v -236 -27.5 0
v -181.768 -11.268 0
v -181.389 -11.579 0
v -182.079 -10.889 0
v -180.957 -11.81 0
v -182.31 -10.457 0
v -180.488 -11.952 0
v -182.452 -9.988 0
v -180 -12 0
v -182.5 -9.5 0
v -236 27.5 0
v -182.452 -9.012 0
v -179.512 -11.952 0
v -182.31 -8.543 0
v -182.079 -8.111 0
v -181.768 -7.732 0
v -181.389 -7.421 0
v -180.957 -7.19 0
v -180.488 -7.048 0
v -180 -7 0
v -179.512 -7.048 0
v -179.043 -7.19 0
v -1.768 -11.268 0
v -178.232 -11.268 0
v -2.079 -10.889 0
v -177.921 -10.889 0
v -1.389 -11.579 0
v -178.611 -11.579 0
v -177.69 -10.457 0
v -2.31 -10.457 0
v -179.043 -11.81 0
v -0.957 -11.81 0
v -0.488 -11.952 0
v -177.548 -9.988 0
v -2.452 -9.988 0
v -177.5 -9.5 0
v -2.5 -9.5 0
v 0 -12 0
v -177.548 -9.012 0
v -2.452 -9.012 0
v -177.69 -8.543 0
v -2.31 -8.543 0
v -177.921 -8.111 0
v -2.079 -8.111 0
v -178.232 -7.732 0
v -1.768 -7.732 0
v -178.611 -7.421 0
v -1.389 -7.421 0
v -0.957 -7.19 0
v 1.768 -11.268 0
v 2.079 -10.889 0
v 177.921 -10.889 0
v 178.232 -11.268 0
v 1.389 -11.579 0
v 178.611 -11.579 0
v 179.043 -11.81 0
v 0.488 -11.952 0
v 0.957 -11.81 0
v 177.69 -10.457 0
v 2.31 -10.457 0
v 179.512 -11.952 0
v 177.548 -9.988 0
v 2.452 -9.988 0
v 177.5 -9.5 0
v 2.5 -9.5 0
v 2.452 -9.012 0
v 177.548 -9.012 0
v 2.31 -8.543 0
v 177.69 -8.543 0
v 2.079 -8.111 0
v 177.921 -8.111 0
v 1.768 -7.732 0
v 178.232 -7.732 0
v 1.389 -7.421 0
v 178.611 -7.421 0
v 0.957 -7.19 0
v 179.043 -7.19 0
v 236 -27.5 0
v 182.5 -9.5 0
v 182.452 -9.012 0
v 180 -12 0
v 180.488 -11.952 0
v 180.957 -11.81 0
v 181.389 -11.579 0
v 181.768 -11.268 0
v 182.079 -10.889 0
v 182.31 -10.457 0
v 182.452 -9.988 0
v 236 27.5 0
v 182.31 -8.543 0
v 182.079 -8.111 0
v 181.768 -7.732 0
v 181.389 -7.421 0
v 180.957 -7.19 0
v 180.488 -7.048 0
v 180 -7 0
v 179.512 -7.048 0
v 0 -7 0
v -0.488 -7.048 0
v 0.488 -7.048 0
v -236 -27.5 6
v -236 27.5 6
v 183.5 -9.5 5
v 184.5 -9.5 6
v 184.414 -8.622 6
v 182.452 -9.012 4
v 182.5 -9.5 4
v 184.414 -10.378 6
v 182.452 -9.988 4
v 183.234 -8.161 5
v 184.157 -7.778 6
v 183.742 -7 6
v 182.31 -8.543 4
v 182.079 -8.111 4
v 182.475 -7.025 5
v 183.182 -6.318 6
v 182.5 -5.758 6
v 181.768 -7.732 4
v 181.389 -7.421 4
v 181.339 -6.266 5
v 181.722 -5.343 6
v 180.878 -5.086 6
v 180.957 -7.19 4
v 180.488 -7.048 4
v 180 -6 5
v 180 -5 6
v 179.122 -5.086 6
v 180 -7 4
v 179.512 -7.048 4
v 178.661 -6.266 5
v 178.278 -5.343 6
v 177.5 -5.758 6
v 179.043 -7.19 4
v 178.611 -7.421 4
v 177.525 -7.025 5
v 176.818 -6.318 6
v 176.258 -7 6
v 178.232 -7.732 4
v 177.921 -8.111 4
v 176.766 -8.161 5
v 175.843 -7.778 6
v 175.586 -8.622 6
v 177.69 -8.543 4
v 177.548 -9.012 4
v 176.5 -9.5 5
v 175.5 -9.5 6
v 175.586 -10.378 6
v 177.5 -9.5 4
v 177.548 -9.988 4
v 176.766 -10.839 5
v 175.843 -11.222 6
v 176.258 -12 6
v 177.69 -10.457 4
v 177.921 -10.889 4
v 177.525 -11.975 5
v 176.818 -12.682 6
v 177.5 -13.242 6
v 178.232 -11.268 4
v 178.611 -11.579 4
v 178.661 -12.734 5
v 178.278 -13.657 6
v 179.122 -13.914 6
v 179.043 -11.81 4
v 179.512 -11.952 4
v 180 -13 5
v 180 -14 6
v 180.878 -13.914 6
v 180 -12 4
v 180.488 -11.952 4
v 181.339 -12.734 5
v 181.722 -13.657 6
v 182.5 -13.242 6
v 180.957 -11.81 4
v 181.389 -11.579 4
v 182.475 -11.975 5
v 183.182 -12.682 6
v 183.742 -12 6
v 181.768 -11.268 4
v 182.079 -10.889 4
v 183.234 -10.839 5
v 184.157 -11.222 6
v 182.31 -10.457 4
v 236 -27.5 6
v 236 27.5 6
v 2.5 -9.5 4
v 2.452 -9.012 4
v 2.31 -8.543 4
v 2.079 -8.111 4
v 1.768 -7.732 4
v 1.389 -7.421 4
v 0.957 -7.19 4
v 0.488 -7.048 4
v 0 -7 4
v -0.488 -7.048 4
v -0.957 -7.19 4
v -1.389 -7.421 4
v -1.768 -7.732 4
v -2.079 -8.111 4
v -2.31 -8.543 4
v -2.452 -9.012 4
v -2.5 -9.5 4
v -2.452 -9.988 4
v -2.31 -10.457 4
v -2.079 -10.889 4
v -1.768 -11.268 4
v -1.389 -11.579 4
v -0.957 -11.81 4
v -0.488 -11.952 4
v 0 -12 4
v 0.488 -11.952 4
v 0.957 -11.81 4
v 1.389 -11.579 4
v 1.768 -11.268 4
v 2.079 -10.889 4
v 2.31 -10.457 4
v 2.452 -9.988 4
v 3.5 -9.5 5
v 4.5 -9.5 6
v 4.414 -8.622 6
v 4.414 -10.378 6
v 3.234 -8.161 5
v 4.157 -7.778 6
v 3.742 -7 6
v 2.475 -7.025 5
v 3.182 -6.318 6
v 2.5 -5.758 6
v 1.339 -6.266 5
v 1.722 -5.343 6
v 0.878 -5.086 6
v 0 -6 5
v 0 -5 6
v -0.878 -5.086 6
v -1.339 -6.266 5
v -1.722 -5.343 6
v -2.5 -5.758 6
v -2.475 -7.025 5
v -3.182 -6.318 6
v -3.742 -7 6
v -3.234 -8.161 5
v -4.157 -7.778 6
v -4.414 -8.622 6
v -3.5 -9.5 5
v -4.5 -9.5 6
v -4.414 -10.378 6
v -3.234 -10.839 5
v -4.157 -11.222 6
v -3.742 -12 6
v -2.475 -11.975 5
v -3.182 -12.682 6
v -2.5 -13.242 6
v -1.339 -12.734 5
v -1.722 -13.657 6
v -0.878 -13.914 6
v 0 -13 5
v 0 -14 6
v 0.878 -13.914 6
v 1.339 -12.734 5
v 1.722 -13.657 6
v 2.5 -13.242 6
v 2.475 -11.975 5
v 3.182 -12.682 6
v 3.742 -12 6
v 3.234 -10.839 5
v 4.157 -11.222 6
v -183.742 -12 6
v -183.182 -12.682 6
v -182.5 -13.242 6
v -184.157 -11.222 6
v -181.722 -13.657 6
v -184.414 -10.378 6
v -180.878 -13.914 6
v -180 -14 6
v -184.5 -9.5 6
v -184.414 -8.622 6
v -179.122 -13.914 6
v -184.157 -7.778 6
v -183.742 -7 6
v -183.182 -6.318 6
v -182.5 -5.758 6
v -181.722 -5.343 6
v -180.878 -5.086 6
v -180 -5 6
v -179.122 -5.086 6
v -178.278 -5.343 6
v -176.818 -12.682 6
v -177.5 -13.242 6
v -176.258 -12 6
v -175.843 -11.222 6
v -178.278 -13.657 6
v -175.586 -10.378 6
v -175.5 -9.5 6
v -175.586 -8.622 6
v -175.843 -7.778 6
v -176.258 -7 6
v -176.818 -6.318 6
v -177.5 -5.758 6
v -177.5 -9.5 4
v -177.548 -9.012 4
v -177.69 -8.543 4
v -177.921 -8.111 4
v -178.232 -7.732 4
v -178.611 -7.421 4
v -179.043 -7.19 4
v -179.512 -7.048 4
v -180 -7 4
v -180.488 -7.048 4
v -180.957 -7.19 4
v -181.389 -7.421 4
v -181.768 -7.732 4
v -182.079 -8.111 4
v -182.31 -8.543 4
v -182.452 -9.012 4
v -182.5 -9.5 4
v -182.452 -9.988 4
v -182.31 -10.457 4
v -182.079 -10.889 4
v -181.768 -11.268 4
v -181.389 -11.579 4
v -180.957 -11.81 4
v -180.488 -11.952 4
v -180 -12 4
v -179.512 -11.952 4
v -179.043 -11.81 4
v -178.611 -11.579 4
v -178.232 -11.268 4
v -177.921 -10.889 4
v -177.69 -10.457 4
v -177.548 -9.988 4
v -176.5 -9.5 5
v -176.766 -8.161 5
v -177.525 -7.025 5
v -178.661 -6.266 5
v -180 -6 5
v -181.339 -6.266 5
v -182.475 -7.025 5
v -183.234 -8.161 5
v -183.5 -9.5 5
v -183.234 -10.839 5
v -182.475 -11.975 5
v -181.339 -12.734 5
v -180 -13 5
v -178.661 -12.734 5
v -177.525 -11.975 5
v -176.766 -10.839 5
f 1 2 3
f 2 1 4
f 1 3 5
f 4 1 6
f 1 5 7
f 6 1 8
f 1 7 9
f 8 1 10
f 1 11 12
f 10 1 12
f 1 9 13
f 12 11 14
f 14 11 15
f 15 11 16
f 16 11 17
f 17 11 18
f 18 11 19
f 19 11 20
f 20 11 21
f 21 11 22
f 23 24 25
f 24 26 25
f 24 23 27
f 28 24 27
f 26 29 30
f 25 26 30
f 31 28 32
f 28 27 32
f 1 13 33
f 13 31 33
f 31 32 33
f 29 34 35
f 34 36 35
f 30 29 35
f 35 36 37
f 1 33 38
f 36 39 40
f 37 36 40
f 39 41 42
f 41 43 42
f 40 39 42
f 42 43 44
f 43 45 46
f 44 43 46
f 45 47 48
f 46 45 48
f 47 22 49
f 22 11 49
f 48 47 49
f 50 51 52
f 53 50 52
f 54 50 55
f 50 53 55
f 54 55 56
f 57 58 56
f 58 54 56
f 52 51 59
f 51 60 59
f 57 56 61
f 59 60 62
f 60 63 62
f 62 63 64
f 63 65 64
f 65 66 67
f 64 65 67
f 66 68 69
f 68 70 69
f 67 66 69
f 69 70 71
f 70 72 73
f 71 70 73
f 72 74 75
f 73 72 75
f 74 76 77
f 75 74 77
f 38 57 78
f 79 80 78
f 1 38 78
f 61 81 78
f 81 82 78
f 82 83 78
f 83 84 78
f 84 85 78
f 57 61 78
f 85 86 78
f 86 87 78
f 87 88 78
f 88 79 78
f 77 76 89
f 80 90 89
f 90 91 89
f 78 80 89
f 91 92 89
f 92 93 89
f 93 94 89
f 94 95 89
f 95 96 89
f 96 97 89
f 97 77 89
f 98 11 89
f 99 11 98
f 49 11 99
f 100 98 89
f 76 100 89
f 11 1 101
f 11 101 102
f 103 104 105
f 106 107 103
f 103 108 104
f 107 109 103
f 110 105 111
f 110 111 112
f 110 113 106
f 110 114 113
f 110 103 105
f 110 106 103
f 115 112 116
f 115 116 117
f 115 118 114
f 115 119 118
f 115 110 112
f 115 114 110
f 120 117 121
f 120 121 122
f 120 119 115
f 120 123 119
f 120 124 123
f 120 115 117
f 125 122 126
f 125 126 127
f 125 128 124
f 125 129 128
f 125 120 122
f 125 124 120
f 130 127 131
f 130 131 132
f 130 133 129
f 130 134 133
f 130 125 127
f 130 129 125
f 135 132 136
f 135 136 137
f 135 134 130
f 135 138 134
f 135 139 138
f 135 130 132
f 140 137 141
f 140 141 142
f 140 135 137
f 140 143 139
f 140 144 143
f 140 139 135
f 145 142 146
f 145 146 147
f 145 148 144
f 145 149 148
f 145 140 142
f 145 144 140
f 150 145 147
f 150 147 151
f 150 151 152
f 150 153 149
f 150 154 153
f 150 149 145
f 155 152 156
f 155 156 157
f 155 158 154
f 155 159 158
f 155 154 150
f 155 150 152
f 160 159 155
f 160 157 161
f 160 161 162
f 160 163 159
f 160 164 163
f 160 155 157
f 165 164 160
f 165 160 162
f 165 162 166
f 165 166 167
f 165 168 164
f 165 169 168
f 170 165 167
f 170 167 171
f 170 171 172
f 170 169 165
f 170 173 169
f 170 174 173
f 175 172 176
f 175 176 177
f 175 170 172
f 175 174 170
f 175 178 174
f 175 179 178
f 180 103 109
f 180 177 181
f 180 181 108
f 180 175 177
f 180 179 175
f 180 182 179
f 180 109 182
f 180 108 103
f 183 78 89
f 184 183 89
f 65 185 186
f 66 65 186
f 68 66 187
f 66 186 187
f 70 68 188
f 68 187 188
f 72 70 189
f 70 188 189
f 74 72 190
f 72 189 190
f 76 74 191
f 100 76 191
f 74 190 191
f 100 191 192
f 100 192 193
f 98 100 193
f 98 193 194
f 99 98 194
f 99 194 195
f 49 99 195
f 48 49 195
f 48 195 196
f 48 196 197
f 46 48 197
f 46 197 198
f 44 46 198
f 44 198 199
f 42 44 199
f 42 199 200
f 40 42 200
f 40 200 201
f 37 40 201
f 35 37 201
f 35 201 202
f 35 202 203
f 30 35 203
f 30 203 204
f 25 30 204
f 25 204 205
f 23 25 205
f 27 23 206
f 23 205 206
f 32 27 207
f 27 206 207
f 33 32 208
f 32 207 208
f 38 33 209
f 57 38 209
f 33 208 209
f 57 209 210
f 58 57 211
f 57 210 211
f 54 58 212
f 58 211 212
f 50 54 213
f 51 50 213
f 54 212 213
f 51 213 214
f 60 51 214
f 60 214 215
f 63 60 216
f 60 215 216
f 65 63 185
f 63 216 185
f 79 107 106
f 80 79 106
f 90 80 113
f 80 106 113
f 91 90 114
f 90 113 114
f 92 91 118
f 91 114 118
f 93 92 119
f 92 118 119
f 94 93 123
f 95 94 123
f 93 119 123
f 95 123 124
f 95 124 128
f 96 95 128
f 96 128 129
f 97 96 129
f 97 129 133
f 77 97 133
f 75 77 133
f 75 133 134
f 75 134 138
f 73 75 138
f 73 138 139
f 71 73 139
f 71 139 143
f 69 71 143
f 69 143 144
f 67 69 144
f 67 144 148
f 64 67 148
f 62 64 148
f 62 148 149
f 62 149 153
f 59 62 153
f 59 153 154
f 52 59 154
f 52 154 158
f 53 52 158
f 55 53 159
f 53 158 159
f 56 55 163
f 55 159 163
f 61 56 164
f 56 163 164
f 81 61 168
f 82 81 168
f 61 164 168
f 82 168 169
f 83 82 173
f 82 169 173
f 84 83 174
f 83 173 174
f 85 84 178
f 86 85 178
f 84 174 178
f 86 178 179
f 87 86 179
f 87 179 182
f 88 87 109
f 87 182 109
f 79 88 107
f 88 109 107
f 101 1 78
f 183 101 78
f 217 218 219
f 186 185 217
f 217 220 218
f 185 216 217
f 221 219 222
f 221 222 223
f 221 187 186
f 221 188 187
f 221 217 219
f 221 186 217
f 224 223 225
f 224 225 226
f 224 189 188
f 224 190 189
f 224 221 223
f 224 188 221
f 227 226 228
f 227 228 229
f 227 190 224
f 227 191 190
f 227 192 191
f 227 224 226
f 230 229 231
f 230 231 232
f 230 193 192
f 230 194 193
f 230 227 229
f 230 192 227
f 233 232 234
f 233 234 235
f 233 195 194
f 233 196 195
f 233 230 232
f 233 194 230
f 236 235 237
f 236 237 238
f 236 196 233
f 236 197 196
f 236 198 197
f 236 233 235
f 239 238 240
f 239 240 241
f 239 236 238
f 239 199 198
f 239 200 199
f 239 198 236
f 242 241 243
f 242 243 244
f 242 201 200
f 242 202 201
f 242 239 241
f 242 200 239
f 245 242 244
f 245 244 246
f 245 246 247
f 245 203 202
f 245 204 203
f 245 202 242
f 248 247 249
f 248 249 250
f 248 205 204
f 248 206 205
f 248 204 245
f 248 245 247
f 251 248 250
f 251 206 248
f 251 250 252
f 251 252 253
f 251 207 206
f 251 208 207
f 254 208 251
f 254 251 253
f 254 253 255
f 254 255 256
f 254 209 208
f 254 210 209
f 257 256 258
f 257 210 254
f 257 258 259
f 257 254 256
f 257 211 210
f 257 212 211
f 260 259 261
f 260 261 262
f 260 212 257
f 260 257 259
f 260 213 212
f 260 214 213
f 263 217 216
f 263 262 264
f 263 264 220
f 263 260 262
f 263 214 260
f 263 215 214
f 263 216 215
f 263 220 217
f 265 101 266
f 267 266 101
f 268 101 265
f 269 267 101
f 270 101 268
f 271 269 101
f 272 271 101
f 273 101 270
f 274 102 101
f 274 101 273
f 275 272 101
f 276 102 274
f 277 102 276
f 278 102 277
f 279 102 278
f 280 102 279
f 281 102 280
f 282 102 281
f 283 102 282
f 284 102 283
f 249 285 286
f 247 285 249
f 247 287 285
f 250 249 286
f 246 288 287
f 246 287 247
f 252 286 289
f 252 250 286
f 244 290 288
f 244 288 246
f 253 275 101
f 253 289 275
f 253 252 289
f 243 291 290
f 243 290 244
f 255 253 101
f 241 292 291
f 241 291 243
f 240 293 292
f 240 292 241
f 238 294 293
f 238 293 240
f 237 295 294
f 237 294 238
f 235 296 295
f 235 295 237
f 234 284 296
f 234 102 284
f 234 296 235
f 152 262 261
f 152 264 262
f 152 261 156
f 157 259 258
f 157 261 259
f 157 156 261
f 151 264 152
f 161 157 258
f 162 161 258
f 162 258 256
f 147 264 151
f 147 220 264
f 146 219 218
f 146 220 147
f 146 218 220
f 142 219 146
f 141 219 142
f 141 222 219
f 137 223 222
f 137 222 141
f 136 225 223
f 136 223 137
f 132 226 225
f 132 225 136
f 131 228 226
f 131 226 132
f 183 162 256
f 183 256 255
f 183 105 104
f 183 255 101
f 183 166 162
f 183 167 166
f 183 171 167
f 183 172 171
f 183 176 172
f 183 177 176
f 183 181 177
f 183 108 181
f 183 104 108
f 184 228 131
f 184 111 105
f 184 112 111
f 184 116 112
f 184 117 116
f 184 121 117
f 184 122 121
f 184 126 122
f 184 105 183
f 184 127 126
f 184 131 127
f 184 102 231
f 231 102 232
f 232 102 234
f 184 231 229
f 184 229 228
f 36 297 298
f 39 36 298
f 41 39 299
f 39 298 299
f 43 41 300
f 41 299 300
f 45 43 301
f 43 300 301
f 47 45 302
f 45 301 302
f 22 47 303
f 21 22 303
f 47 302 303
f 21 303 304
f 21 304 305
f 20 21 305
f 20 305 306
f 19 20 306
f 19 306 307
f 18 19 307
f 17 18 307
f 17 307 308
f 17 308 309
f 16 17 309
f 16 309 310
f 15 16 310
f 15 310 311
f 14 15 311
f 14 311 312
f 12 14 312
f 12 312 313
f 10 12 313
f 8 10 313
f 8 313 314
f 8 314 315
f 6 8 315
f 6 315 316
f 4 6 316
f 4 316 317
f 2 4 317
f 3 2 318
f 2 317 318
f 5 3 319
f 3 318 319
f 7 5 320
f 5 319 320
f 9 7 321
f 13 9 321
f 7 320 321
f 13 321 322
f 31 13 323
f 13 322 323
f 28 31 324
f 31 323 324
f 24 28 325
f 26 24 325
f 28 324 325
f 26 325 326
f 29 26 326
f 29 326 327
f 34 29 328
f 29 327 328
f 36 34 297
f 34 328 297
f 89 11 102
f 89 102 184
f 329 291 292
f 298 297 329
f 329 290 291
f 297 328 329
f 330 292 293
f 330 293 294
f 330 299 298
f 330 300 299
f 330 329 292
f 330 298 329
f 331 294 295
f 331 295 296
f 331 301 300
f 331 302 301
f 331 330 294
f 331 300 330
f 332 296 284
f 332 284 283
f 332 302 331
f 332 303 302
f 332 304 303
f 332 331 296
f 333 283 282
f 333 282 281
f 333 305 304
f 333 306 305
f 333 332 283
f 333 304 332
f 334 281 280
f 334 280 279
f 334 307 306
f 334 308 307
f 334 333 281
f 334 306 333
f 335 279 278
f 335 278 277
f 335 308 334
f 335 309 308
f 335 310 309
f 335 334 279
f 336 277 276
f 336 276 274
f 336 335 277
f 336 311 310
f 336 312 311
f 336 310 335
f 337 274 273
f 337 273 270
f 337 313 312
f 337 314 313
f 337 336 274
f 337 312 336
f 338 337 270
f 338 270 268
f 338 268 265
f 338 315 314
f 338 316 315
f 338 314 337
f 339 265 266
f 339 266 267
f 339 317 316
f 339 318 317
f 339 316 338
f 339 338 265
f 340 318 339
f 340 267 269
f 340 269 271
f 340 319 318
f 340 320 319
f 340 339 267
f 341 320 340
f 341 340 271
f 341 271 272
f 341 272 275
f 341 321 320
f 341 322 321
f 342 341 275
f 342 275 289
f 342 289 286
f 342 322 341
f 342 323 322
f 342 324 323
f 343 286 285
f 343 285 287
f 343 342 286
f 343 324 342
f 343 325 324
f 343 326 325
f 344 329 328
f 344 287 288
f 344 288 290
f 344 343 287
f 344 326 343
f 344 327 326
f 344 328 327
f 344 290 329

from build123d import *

# Parameters (mm, degrees)
ESQUISSE1_W             = 472
ESQUISSE1_H             = 55
BOSS_EXTRU_1_DEPTH      = 6
ESQUISSE6_R             = 2.5
ENL_V_MAT_EXTRU_1_DEPTH = 238.672568884
CHANFREIN1_SIZE         = 2


with BuildPart() as part:
    # Esquisse1 → Boss.-Extru.1 (new body)
    with BuildSketch(Plane.XY):
        Rectangle(ESQUISSE1_W, ESQUISSE1_H)
    extrude(amount=BOSS_EXTRU_1_DEPTH)

    # Esquisse6 → Enlèv. mat.-Extru.1 (cut, through all)
    with BuildSketch(Plane.XY.offset(6)):
        with Locations((-180, -9.5)):
            Circle(ESQUISSE6_R)
        with Locations((0, -9.5)):
            Circle(ESQUISSE6_R)
        with Locations((180, -9.5)):
            Circle(ESQUISSE6_R)
    extrude(amount=-ENL_V_MAT_EXTRU_1_DEPTH, mode=Mode.SUBTRACT)

    # Chanfrein1
    chanfrein1_edges = [part.edges().sort_by_distance(p)[0] for p in [
        (-182.5, -9.5, 6),
        (-2.5, -9.5, 6),
        (177.5, -9.5, 6),
    ]]
    chamfer(chanfrein1_edges, length=CHANFREIN1_SIZE)


solid = part.part
